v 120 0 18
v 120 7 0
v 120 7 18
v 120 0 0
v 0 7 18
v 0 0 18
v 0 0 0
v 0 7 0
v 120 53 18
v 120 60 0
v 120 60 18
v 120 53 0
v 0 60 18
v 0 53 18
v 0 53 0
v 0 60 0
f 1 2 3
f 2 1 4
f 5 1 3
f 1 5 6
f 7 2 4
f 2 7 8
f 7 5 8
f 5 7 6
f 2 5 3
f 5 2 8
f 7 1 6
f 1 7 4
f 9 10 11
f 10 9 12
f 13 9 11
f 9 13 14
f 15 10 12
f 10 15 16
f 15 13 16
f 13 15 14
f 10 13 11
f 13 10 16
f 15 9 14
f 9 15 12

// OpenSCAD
// ============================================================
// Low rectangular open web plate with stiffening ribs
// and two tall solid side walls along the long edges
// ============================================================

// ---------- Global parameters ----------
plate_len    = 120;   // overall length (X)
plate_wid    = 60;    // overall width  (Y)
web_thk      = 4;     // thickness (height) of the thin open web
frame_w      = 6;     // width of the perimeter rib
rib_w        = 4;     // width of internal cross / diagonal ribs

cells_x      = 4;     // web cells along X
cells_y      = 2;     // web cells along Y

hub_d        = 18;    // outer diameter of the circular hubs
hole_d       = 10;    // diameter of the circular through openings

wall_thk     = 7;     // thickness of each long side wall
wall_h       = 18;    // height of the side walls (from the same base plane)

$fn = 64;

// Derived cell pitch
cell_x = plate_len / cells_x;
cell_y = plate_wid / cells_y;

// ---------- Helper: straight rib between two 2D points ----------
module rib(p1, p2, w) {
    hull() {
        translate(p1) circle(d = w, $fn = 24);
        translate(p2) circle(d = w, $fn = 24);
    }
}

// ---------- 2D profile of the open web ----------
module web_profile() {
    difference() {
        union() {
            // Perimeter frame
            difference() {
                square([plate_len, plate_wid]);
                translate([frame_w, frame_w])
                    square([plate_len - 2*frame_w, plate_wid - 2*frame_w]);
            }

            // Internal cross ribs (grid lines along Y)
            for (i = [1 : cells_x - 1])
                rib([i*cell_x, 0], [i*cell_x, plate_wid], rib_w);

            // Internal cross ribs (grid lines along X)
            for (j = [1 : cells_y - 1])
                rib([0, j*cell_y], [plate_len, j*cell_y], rib_w);

            // Diagonal ribs + circular hubs inside every cell
            for (i = [0 : cells_x - 1], j = [0 : cells_y - 1]) {
                x0 = i*cell_x;      x1 = (i+1)*cell_x;
                y0 = j*cell_y;      y1 = (j+1)*cell_y;

                rib([x0, y0], [x1, y1], rib_w);   // diagonal "/"
                rib([x0, y1], [x1, y0], rib_w);   // diagonal "\"

                // Hub at cell centre
                translate([(x0+x1)/2, (y0+y1)/2])
                    circle(d = hub_d);
            }
        }

        // Circular through openings at each hub centre
        for (i = [0 : cells_x - 1], j = [0 : cells_y - 1])
            translate([(i+0.5)*cell_x, (j+0.5)*cell_y])
                circle(d = hole_d);
    }
}

// ---------- Thin open web body ----------
module web_body() {
    linear_extrude(height = web_thk)
        web_profile();
}

// ---------- Tall solid side walls on the two long edges ----------
module side_walls() {
    // Wall at y = 0
    cube([plate_len, wall_thk, wall_h]);
    // Wall at y = plate_wid
    translate([0, plate_wid - wall_thk, 0])
        cube([plate_len, wall_thk, wall_h]);
}

// ---------- Final assembly (stepped depth: web shallow, walls tall) ----------
module open_web_plate() {
    union() {
        web_body();     // shallow perforated web
        side_walls();   // added solid material, rising above the web
    }
}

open_web_plate();
